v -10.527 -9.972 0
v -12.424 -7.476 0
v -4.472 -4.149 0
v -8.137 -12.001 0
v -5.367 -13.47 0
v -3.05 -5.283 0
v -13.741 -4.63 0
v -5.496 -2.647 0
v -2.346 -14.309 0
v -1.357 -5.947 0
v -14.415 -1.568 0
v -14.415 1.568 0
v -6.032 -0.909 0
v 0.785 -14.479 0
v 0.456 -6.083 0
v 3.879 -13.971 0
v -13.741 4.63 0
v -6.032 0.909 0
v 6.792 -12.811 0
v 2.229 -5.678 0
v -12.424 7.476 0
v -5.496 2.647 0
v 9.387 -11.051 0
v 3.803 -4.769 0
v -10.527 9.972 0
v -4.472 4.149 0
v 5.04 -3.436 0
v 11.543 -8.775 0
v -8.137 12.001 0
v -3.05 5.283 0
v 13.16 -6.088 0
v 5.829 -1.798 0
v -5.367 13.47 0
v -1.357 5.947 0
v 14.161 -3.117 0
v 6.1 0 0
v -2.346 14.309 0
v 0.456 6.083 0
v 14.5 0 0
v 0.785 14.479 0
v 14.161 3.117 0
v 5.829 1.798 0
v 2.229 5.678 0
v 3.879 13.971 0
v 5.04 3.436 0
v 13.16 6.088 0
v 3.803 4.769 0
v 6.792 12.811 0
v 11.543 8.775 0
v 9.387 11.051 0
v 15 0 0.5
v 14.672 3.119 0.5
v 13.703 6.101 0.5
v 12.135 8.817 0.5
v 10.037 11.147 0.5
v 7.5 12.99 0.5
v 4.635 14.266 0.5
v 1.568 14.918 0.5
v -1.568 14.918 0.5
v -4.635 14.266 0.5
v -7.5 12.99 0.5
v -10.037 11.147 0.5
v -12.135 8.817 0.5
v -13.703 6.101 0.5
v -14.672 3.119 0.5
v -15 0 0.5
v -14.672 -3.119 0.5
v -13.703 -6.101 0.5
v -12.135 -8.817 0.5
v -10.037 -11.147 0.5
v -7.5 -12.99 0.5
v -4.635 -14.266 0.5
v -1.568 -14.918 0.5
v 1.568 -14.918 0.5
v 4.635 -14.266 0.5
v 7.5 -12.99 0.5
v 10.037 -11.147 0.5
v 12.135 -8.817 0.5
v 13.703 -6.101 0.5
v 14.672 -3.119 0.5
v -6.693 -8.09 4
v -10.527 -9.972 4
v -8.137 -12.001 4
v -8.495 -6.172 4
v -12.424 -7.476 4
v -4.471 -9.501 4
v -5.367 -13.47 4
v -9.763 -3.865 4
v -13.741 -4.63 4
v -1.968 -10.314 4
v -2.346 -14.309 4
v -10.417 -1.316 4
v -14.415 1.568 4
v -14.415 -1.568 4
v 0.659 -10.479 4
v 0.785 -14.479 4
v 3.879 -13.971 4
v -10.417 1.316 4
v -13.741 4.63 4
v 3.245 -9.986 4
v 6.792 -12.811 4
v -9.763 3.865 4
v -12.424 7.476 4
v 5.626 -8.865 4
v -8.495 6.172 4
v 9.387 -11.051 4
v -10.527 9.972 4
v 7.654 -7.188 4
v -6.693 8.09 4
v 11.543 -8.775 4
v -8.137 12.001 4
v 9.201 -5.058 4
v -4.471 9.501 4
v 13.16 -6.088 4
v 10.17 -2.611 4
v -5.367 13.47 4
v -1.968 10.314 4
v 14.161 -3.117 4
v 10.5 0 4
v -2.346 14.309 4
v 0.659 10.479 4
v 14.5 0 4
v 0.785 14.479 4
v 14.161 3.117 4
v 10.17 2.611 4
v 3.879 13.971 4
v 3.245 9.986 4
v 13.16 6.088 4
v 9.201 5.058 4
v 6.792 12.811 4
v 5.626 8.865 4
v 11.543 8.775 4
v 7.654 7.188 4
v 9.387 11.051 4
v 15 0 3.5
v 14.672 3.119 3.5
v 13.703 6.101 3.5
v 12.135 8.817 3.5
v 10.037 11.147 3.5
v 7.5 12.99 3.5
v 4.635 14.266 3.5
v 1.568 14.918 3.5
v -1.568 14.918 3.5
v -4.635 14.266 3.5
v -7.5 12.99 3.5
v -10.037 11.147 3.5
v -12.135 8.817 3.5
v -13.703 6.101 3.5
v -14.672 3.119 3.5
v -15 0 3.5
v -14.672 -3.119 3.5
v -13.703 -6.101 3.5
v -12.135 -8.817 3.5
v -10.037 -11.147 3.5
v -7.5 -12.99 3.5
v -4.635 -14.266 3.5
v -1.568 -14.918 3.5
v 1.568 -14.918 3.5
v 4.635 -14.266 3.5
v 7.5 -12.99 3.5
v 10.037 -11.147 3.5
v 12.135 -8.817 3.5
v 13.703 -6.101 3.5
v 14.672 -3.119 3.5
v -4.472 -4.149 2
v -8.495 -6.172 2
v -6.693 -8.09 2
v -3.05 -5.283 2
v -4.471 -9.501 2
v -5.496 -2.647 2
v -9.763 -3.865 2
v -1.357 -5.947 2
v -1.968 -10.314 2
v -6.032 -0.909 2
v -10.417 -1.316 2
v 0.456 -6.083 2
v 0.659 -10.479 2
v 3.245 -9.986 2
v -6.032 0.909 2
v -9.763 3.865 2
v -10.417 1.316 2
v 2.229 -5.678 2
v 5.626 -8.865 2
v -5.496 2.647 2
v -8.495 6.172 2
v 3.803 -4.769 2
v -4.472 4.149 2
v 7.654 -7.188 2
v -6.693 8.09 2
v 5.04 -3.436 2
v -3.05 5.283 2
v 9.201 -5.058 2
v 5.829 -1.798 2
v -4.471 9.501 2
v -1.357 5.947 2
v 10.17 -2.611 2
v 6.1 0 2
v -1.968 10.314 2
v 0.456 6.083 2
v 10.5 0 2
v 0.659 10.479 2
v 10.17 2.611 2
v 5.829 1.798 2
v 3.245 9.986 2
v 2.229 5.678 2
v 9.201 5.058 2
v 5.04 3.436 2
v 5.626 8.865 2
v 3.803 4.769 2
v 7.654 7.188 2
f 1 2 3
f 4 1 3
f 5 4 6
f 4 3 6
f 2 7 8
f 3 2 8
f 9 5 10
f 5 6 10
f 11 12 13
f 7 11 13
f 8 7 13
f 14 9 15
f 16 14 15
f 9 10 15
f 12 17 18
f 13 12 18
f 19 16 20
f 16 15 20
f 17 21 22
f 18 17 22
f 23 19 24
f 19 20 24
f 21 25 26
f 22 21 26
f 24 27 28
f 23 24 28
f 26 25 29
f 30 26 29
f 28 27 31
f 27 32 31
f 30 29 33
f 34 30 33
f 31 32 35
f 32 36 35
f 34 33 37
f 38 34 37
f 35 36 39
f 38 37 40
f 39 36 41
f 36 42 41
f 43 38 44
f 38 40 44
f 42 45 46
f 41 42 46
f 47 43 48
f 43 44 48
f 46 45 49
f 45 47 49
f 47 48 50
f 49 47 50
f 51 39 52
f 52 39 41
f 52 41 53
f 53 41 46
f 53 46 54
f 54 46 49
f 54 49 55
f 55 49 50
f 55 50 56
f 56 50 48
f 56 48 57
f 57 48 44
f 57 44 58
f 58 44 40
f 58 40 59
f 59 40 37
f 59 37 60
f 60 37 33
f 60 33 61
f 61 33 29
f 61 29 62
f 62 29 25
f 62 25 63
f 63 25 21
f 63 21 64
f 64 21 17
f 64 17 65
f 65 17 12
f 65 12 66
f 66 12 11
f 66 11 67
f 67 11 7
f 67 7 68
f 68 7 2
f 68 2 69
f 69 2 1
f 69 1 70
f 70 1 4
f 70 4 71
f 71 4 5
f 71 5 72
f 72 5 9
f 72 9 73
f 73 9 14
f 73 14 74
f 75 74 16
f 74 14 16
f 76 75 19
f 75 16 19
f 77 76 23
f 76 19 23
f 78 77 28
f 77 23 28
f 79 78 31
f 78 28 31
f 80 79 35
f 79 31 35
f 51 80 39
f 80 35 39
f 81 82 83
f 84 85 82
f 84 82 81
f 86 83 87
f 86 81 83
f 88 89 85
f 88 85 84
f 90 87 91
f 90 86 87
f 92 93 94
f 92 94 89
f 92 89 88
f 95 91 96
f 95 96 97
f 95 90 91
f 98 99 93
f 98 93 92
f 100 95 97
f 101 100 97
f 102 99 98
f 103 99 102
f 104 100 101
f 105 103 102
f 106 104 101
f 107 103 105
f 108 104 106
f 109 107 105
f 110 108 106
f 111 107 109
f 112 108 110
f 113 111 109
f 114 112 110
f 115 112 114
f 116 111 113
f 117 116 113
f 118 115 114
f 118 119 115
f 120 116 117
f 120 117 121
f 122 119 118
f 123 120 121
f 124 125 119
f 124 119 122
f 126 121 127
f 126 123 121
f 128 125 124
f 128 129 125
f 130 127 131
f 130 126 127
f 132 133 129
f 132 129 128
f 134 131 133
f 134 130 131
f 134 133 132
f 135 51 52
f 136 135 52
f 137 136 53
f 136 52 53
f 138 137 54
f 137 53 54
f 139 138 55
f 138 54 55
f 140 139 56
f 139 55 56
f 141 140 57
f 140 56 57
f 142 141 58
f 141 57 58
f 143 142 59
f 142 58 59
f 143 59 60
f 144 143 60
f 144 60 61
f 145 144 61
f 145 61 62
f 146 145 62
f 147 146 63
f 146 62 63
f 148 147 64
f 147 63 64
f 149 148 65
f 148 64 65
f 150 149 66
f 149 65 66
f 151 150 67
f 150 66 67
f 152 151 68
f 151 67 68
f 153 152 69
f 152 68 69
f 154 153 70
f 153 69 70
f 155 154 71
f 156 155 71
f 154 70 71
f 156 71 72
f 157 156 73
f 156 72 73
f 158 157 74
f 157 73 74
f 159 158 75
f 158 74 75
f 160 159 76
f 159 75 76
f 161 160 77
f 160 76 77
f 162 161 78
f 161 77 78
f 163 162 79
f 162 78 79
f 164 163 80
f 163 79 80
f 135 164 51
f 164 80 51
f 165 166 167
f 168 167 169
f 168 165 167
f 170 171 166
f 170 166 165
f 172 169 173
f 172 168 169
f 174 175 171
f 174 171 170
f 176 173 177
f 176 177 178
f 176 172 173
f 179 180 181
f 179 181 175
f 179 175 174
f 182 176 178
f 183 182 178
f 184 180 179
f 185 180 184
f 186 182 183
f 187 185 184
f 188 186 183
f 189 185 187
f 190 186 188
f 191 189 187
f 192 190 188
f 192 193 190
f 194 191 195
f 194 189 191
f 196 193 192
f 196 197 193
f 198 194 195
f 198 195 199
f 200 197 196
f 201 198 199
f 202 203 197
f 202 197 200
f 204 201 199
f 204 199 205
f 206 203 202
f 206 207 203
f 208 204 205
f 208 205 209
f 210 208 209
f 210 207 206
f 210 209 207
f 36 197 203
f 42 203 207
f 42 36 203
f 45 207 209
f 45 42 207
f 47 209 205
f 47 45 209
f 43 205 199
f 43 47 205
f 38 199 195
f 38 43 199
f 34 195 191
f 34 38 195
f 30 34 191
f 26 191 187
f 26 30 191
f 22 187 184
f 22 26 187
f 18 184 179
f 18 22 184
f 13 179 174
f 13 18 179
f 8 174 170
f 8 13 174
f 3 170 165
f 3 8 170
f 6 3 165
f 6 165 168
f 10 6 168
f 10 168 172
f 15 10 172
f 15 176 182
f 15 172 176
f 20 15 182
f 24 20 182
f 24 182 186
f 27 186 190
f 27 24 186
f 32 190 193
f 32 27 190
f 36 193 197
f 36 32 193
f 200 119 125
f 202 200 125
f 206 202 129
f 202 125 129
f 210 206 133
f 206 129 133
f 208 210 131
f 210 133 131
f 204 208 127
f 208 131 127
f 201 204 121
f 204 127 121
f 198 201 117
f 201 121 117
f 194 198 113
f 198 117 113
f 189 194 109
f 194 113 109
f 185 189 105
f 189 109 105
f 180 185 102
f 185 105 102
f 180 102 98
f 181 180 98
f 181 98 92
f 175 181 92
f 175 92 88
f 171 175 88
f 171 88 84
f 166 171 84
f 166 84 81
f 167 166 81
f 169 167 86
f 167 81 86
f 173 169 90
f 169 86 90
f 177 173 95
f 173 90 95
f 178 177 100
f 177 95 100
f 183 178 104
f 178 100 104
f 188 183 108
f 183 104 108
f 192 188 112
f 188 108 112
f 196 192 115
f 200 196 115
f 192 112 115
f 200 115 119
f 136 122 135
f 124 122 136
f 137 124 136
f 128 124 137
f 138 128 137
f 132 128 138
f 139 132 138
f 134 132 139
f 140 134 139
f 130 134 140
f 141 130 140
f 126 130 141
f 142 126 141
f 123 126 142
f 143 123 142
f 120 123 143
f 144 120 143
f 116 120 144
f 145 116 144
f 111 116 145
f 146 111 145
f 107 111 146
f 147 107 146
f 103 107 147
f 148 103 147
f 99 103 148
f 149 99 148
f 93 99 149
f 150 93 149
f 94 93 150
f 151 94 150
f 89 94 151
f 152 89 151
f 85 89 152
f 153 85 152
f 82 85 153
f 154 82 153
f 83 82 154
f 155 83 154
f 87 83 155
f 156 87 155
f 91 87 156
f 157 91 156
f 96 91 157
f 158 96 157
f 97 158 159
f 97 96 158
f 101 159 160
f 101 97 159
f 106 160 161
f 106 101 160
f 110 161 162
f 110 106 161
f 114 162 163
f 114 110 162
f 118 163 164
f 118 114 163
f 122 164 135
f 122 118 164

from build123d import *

# Parameters (mm, degrees)
ESQUISSE1_R             = 15
ESQUISSE1_R_2           = 6.1
BOSS_EXTRU_1_DEPTH      = 4
ESQUISSE2_R             = 10.5
ENL_V_MAT_EXTRU_1_DEPTH = 2
CHANFREIN1_SIZE         = 0.5


with BuildPart() as part:
    # Esquisse1 → Boss.-Extru.1 (new body)
    with BuildSketch(Plane.XY):
        Circle(ESQUISSE1_R)
        Circle(ESQUISSE1_R_2, mode=Mode.SUBTRACT)
    extrude(amount=BOSS_EXTRU_1_DEPTH)

    # Esquisse2 → Enlèv. mat.-Extru.1 (cut)
    with BuildSketch(Plane.XY.offset(4)):
        Circle(ESQUISSE2_R)
    extrude(amount=-ENL_V_MAT_EXTRU_1_DEPTH, mode=Mode.SUBTRACT)

    # Chanfrein1
    chanfrein1_edges = [part.edges().sort_by_distance(p)[0] for p in [
        (-15, 0, 0),
        (-15, 0, 4),
    ]]
    chamfer(chanfrein1_edges, length=CHANFREIN1_SIZE)


solid = part.part
